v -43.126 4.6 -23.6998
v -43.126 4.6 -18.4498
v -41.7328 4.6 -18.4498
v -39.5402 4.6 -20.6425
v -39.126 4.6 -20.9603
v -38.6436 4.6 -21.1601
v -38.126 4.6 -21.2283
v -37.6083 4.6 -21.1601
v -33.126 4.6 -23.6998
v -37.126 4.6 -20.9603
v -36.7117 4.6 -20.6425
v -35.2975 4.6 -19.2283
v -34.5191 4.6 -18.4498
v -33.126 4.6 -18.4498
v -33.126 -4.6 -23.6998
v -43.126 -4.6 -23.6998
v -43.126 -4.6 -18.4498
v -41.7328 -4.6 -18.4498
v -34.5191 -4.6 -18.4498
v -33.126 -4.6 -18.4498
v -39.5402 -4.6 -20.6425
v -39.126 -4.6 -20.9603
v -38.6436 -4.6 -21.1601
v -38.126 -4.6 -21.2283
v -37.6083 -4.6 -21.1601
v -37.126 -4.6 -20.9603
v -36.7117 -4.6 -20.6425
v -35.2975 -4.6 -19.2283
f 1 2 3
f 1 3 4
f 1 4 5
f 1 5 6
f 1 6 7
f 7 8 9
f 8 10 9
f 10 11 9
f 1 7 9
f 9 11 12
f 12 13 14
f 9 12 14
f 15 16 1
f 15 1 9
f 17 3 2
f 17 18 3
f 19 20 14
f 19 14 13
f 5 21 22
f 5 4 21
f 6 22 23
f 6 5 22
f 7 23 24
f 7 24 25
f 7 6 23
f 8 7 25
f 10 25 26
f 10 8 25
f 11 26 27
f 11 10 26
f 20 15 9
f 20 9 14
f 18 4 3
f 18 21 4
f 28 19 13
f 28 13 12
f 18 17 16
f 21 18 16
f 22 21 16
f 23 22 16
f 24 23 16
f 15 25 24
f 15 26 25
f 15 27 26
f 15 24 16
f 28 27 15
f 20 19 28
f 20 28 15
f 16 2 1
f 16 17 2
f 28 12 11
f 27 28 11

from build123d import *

# Parameters (mm, degrees)
F1_DEPTH = 4.6
F2_R     = 2


with BuildPart() as f1:
    # F0 (on Front) → F1 (new body, symmetric)
    with BuildSketch(Plane.XZ):
        Polygon((-43.125954, -18.449846), (-43.125954, -23.699846), (-33.125954, -23.699846), (-33.125954, -18.449846), (-34.519099, -18.449846), (-35.297526, -19.228273), (-38.125954, -22.0567), (-40.954381, -19.228273), (-41.732808, -18.449846), align=None)
    extrude(amount=F1_DEPTH, both=True)

    # F2
    f2_edges = [f1.edges().sort_by_distance(p)[0] for p in [
        (-38.125954, 0, -22.0567),
    ]]
    fillet(f2_edges, radius=F2_R)


solid = f1.part
